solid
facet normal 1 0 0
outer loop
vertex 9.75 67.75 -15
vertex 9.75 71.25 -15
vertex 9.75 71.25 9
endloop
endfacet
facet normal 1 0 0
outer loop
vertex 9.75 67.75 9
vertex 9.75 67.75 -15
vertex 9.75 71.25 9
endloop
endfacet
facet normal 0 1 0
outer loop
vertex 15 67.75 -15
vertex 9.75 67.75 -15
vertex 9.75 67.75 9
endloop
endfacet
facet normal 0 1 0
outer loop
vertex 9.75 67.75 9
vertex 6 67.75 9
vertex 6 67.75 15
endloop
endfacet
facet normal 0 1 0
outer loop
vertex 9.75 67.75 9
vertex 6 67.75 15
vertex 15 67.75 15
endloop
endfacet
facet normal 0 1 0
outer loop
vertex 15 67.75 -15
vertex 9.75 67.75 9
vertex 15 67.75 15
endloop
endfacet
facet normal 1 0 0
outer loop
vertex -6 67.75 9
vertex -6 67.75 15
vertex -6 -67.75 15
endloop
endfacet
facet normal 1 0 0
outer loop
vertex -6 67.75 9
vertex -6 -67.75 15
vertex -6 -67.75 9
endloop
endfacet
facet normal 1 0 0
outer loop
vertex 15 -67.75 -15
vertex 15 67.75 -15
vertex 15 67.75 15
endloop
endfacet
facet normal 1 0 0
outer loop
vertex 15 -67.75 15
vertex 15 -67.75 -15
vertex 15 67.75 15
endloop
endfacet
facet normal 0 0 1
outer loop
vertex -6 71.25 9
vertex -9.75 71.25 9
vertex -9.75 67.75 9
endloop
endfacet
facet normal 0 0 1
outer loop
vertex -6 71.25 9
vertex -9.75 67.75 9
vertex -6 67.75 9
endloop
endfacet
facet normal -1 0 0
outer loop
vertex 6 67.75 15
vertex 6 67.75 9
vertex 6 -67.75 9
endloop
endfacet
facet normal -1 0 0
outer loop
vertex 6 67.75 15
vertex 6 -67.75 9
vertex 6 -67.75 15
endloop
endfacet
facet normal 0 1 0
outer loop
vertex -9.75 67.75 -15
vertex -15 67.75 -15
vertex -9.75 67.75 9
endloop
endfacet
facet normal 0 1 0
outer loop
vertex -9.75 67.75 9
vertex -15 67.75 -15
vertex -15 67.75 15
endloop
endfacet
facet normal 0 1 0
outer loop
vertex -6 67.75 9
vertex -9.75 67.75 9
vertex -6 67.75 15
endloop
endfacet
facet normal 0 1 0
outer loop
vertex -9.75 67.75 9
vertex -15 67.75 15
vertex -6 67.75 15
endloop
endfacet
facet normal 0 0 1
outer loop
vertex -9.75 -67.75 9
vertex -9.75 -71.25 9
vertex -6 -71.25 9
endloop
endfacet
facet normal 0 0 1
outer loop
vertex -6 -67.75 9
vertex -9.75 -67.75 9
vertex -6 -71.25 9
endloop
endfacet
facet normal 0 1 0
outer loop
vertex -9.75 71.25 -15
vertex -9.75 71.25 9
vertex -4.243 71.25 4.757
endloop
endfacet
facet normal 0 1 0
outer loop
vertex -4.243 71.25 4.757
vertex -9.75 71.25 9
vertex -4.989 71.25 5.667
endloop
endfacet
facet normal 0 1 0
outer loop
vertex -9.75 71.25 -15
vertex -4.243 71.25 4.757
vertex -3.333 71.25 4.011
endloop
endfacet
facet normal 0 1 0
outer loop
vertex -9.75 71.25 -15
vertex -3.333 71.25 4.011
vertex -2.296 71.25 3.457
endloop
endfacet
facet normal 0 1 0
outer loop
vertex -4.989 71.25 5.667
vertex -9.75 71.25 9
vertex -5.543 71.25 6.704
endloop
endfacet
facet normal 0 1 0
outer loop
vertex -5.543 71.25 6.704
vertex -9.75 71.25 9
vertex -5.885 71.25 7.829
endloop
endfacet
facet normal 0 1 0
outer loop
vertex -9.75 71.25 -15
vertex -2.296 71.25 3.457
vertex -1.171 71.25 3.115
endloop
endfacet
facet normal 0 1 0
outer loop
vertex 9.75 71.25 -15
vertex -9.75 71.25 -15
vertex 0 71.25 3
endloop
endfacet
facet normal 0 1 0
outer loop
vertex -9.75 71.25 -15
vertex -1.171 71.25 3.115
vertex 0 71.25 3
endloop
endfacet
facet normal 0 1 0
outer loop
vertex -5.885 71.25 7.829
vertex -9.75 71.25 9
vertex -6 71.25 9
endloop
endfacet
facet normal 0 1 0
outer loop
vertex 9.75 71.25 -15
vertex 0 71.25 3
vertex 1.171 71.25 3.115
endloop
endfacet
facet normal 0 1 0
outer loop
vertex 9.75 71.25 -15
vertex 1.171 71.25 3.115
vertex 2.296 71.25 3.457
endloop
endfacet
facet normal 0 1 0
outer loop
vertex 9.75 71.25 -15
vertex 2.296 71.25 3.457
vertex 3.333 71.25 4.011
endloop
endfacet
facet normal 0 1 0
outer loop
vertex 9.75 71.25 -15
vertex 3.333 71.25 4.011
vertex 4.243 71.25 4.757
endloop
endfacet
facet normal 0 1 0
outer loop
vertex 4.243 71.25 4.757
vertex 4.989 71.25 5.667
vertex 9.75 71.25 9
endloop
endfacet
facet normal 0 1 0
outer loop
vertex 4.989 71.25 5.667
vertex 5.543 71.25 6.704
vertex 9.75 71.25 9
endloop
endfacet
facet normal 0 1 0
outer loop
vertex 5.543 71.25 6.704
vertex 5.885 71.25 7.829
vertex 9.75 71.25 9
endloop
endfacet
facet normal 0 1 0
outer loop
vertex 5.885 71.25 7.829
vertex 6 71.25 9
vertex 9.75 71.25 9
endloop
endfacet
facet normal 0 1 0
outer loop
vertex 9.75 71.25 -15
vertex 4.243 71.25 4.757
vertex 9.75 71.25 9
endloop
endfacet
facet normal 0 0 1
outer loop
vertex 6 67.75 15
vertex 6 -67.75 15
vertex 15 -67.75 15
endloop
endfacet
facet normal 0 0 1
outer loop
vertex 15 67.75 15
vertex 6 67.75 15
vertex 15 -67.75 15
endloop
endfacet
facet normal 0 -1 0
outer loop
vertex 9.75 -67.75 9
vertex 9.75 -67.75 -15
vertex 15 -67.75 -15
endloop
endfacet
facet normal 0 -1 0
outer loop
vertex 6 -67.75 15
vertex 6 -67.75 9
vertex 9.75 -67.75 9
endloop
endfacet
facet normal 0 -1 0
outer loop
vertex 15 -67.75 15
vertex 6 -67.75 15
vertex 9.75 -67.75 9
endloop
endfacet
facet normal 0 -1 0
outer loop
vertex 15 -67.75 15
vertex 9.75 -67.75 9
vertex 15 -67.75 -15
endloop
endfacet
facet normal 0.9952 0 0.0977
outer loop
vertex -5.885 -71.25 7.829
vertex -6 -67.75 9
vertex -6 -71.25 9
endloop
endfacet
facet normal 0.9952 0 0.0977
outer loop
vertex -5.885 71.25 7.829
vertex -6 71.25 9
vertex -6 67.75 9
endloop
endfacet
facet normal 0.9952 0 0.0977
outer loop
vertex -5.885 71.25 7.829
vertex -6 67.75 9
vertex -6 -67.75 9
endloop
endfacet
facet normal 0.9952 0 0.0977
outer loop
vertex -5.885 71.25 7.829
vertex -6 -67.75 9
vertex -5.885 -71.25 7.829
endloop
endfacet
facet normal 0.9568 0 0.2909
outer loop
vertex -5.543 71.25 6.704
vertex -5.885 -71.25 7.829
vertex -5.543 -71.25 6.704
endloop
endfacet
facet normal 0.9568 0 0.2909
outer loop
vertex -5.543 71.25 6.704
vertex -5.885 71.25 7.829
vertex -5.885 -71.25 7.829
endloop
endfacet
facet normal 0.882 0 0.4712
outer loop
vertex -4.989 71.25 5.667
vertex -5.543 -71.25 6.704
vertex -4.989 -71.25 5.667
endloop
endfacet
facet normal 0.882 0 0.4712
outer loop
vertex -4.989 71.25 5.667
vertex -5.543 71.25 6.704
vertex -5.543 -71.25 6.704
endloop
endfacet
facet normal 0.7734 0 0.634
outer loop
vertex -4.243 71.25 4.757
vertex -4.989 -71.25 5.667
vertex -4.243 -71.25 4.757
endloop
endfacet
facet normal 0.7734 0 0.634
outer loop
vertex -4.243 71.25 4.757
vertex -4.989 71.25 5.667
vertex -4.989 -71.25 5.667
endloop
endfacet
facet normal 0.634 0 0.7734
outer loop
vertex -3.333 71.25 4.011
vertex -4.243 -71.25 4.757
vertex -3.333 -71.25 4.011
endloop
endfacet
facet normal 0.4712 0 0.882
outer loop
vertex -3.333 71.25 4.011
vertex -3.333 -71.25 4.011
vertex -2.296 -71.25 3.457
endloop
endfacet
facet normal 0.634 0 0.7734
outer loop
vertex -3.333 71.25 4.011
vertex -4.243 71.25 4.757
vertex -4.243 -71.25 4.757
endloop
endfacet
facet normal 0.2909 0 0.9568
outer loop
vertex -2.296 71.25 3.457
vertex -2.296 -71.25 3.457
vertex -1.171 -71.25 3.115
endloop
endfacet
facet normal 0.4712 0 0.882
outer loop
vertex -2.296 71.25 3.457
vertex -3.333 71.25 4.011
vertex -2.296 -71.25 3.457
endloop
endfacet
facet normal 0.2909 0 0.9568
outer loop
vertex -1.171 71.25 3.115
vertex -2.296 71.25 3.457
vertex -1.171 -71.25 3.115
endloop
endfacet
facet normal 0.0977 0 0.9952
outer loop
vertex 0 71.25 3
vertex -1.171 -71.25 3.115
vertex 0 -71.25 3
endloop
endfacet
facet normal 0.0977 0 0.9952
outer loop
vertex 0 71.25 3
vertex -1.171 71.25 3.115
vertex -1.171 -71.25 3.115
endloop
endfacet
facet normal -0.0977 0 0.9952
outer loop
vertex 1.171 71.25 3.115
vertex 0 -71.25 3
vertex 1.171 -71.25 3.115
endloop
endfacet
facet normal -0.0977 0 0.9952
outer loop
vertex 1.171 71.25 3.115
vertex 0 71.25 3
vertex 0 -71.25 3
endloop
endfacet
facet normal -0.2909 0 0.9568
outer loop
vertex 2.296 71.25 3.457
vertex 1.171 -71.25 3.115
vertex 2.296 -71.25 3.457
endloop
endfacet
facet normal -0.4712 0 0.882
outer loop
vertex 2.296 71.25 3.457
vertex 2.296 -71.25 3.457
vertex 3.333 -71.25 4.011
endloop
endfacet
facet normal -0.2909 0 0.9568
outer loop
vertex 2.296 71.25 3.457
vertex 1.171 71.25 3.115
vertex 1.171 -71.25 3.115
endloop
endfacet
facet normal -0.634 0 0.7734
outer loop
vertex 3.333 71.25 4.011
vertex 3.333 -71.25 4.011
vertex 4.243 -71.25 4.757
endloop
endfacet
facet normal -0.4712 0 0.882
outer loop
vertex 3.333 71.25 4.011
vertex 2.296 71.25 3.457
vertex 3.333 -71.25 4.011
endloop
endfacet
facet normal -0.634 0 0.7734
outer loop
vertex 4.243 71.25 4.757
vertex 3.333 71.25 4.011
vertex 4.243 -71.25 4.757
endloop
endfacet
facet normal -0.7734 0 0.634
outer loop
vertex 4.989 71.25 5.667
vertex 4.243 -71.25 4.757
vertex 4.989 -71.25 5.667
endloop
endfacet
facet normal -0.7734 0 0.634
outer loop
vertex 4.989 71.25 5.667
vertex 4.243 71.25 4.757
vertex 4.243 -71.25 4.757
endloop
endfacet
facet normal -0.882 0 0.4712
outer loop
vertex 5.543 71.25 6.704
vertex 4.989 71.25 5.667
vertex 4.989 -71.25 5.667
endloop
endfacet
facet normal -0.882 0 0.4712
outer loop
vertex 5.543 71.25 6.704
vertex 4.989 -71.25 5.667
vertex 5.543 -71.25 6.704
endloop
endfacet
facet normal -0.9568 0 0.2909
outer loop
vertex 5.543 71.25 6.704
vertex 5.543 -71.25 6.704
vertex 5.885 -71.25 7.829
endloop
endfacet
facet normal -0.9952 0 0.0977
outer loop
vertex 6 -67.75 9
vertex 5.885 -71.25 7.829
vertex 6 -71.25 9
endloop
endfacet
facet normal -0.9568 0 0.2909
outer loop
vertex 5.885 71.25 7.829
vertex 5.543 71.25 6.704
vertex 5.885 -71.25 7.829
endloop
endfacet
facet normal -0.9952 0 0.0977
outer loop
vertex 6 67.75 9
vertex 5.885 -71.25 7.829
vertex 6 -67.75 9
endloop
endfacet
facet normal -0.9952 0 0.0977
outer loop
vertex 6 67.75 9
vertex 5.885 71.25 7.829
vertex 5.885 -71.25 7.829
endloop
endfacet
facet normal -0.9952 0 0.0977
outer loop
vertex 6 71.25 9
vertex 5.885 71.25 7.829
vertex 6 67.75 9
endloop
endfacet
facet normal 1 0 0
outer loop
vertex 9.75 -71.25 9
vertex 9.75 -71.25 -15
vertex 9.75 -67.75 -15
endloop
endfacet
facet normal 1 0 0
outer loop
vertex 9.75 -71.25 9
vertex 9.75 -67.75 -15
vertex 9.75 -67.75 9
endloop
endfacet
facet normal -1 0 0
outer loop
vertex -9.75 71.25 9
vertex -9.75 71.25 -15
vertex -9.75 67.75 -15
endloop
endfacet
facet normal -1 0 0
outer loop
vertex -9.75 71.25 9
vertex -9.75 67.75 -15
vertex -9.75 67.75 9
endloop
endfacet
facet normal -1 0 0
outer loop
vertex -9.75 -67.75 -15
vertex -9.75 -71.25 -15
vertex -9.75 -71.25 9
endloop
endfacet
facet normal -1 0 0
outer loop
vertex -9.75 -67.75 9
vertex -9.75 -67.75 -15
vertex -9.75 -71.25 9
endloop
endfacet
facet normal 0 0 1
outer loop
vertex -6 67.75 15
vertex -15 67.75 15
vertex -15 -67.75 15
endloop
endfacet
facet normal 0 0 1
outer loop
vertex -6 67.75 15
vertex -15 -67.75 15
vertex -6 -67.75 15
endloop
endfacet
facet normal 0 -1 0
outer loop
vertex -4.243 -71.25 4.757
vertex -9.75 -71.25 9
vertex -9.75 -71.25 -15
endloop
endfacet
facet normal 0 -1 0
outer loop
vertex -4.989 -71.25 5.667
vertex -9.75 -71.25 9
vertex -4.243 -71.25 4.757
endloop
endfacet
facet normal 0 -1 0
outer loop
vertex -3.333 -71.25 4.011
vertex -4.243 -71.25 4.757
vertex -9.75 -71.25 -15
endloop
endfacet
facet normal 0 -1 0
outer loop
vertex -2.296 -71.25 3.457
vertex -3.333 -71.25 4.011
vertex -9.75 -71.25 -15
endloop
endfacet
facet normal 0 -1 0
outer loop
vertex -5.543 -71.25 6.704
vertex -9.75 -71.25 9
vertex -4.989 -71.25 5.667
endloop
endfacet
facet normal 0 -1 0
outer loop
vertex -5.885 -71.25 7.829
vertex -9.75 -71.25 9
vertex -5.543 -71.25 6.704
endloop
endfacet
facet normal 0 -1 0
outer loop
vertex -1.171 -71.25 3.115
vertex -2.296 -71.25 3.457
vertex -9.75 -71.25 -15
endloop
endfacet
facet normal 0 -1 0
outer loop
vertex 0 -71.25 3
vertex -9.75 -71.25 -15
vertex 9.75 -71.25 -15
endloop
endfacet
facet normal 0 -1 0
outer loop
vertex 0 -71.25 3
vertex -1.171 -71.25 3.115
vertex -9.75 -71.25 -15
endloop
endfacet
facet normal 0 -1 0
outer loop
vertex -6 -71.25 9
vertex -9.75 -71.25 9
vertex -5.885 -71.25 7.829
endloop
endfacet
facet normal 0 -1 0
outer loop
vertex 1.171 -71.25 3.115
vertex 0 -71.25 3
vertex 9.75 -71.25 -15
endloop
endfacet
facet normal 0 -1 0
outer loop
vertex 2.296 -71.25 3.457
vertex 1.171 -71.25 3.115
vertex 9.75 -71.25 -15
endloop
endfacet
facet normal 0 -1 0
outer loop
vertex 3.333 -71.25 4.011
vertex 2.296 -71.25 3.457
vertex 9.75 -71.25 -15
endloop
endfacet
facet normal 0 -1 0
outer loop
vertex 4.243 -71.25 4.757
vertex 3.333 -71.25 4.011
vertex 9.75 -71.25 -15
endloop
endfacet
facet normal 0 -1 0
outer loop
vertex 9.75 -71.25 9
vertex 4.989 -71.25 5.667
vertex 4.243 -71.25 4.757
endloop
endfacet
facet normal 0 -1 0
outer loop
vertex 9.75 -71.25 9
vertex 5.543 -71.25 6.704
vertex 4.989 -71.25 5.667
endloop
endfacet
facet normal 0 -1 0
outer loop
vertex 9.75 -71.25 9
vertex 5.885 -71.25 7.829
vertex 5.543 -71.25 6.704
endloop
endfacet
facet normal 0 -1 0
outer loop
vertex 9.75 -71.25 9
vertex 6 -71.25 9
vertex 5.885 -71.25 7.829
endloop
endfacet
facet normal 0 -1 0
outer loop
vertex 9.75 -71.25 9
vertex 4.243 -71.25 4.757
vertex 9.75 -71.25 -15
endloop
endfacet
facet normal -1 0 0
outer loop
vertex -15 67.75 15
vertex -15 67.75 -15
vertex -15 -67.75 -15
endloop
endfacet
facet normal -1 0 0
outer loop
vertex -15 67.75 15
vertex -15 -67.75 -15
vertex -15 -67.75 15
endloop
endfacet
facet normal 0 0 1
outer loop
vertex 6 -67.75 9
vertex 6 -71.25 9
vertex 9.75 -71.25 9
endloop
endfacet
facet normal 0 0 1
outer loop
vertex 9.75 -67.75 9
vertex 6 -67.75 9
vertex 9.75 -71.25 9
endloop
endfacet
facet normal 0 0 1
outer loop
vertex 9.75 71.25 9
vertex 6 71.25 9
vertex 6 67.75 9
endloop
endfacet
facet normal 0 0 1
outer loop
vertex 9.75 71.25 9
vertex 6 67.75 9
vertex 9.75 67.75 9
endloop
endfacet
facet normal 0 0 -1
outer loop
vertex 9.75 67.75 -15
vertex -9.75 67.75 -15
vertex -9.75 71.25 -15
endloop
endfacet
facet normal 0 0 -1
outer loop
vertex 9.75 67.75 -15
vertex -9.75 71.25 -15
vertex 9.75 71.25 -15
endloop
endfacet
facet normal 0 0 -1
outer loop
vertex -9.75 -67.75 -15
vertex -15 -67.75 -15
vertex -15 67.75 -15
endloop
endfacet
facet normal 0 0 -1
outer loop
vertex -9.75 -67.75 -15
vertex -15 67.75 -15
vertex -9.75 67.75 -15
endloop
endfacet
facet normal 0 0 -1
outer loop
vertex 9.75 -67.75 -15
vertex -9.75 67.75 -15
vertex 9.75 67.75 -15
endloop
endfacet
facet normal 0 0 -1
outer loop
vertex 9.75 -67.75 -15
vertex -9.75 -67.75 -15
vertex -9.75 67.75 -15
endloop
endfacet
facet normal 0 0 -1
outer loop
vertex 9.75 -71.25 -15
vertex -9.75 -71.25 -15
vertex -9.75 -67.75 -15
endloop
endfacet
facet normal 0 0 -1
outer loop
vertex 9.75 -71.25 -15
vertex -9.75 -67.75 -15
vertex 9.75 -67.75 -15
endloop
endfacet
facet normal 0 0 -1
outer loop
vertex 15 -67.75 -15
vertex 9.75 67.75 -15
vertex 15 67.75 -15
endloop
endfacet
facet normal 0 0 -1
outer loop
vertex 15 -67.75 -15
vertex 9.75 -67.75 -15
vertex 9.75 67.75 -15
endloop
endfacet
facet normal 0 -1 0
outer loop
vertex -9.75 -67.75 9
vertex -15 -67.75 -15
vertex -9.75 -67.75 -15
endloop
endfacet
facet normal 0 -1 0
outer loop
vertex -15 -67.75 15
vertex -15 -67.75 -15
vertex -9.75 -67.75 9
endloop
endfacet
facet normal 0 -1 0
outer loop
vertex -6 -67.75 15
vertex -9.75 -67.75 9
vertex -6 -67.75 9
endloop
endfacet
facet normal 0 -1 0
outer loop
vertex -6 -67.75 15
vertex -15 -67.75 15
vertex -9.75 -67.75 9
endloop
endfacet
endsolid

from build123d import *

# Parameters (mm, degrees)
F0_W     = 30
F0_H     = 30
F1_DEPTH = 71.25
F3_DEPTH = 71.251
F4_W     = 5.25
F4_H     = 24
F5_DEPTH = 3.5


# Not quite as in the source:
# - a feature names something its author has since deleted; it is built from what else it names


with BuildPart() as f1:
    # F0 (on Front) → F1 (new body)
    with BuildSketch(Plane.XZ):
        Rectangle(F0_W, F0_H)
    extrude(amount=F1_DEPTH)

    # F2 (on face) → F3 (cut, through all)
    with BuildSketch(Plane.XZ.offset(71.25)):
        with BuildLine():
            Line((6, 9), (6, 15))
            Line((6, 15), (-6, 15))
            Line((-6, 15), (-6, 9))
            ThreePointArc((-6, 9), (0, 3), (6, 9))
        make_face()
    extrude(amount=-F3_DEPTH, mode=Mode.SUBTRACT)

    # F4 (on face) → F5 (cut)
    with BuildSketch(Plane.XZ.offset(71.25)):
        with BuildLine():
            ThreePointArc((-9.75, 9), (-9.2193635213, 12.1726702101), (-7.6852130745, 15))
            Line((-7.6852130745, 15), (-15, 15))
            Line((-15, 15), (-15, 9))
            Line((-15, 9), (-9.75, 9))
        make_face()
        with BuildLine():
            Line((6, 9), (9.75, 9))
            ThreePointArc((9.75, 9), (9.2193635213, 12.1726702101), (7.6852130745, 15))
            Line((7.6852130745, 15), (6, 15))
            Line((6, 15), (6, 9))
        make_face()
        with BuildLine():
            ThreePointArc((7.6852130745, 15), (9.2193635213, 12.1726702101), (9.75, 9))
            Line((9.75, 9), (15, 9))
            Line((15, 9), (15, 15))
            Line((15, 15), (7.6852130745, 15))
        make_face()
        with Locations((-12.375, -3)):
            Rectangle(F4_W, F4_H)
        with Locations((12.375, -3)):
            Rectangle(F4_W, F4_H)
        with BuildLine():
            Line((-6, 15), (-7.6852130745, 15))
            ThreePointArc((-7.6852130745, 15), (-9.2193635213, 12.1726702101), (-9.75, 9))
            Line((-9.75, 9), (-6, 9))
            Line((-6, 9), (-6, 15))
        make_face()
    extrude(amount=-F5_DEPTH, mode=Mode.SUBTRACT)

    # F6: F1 across plane


with BuildPart() as f1_1:
    add(f1.part)
    add(f1.part.mirror(Plane.XZ))


solid = f1_1.part
